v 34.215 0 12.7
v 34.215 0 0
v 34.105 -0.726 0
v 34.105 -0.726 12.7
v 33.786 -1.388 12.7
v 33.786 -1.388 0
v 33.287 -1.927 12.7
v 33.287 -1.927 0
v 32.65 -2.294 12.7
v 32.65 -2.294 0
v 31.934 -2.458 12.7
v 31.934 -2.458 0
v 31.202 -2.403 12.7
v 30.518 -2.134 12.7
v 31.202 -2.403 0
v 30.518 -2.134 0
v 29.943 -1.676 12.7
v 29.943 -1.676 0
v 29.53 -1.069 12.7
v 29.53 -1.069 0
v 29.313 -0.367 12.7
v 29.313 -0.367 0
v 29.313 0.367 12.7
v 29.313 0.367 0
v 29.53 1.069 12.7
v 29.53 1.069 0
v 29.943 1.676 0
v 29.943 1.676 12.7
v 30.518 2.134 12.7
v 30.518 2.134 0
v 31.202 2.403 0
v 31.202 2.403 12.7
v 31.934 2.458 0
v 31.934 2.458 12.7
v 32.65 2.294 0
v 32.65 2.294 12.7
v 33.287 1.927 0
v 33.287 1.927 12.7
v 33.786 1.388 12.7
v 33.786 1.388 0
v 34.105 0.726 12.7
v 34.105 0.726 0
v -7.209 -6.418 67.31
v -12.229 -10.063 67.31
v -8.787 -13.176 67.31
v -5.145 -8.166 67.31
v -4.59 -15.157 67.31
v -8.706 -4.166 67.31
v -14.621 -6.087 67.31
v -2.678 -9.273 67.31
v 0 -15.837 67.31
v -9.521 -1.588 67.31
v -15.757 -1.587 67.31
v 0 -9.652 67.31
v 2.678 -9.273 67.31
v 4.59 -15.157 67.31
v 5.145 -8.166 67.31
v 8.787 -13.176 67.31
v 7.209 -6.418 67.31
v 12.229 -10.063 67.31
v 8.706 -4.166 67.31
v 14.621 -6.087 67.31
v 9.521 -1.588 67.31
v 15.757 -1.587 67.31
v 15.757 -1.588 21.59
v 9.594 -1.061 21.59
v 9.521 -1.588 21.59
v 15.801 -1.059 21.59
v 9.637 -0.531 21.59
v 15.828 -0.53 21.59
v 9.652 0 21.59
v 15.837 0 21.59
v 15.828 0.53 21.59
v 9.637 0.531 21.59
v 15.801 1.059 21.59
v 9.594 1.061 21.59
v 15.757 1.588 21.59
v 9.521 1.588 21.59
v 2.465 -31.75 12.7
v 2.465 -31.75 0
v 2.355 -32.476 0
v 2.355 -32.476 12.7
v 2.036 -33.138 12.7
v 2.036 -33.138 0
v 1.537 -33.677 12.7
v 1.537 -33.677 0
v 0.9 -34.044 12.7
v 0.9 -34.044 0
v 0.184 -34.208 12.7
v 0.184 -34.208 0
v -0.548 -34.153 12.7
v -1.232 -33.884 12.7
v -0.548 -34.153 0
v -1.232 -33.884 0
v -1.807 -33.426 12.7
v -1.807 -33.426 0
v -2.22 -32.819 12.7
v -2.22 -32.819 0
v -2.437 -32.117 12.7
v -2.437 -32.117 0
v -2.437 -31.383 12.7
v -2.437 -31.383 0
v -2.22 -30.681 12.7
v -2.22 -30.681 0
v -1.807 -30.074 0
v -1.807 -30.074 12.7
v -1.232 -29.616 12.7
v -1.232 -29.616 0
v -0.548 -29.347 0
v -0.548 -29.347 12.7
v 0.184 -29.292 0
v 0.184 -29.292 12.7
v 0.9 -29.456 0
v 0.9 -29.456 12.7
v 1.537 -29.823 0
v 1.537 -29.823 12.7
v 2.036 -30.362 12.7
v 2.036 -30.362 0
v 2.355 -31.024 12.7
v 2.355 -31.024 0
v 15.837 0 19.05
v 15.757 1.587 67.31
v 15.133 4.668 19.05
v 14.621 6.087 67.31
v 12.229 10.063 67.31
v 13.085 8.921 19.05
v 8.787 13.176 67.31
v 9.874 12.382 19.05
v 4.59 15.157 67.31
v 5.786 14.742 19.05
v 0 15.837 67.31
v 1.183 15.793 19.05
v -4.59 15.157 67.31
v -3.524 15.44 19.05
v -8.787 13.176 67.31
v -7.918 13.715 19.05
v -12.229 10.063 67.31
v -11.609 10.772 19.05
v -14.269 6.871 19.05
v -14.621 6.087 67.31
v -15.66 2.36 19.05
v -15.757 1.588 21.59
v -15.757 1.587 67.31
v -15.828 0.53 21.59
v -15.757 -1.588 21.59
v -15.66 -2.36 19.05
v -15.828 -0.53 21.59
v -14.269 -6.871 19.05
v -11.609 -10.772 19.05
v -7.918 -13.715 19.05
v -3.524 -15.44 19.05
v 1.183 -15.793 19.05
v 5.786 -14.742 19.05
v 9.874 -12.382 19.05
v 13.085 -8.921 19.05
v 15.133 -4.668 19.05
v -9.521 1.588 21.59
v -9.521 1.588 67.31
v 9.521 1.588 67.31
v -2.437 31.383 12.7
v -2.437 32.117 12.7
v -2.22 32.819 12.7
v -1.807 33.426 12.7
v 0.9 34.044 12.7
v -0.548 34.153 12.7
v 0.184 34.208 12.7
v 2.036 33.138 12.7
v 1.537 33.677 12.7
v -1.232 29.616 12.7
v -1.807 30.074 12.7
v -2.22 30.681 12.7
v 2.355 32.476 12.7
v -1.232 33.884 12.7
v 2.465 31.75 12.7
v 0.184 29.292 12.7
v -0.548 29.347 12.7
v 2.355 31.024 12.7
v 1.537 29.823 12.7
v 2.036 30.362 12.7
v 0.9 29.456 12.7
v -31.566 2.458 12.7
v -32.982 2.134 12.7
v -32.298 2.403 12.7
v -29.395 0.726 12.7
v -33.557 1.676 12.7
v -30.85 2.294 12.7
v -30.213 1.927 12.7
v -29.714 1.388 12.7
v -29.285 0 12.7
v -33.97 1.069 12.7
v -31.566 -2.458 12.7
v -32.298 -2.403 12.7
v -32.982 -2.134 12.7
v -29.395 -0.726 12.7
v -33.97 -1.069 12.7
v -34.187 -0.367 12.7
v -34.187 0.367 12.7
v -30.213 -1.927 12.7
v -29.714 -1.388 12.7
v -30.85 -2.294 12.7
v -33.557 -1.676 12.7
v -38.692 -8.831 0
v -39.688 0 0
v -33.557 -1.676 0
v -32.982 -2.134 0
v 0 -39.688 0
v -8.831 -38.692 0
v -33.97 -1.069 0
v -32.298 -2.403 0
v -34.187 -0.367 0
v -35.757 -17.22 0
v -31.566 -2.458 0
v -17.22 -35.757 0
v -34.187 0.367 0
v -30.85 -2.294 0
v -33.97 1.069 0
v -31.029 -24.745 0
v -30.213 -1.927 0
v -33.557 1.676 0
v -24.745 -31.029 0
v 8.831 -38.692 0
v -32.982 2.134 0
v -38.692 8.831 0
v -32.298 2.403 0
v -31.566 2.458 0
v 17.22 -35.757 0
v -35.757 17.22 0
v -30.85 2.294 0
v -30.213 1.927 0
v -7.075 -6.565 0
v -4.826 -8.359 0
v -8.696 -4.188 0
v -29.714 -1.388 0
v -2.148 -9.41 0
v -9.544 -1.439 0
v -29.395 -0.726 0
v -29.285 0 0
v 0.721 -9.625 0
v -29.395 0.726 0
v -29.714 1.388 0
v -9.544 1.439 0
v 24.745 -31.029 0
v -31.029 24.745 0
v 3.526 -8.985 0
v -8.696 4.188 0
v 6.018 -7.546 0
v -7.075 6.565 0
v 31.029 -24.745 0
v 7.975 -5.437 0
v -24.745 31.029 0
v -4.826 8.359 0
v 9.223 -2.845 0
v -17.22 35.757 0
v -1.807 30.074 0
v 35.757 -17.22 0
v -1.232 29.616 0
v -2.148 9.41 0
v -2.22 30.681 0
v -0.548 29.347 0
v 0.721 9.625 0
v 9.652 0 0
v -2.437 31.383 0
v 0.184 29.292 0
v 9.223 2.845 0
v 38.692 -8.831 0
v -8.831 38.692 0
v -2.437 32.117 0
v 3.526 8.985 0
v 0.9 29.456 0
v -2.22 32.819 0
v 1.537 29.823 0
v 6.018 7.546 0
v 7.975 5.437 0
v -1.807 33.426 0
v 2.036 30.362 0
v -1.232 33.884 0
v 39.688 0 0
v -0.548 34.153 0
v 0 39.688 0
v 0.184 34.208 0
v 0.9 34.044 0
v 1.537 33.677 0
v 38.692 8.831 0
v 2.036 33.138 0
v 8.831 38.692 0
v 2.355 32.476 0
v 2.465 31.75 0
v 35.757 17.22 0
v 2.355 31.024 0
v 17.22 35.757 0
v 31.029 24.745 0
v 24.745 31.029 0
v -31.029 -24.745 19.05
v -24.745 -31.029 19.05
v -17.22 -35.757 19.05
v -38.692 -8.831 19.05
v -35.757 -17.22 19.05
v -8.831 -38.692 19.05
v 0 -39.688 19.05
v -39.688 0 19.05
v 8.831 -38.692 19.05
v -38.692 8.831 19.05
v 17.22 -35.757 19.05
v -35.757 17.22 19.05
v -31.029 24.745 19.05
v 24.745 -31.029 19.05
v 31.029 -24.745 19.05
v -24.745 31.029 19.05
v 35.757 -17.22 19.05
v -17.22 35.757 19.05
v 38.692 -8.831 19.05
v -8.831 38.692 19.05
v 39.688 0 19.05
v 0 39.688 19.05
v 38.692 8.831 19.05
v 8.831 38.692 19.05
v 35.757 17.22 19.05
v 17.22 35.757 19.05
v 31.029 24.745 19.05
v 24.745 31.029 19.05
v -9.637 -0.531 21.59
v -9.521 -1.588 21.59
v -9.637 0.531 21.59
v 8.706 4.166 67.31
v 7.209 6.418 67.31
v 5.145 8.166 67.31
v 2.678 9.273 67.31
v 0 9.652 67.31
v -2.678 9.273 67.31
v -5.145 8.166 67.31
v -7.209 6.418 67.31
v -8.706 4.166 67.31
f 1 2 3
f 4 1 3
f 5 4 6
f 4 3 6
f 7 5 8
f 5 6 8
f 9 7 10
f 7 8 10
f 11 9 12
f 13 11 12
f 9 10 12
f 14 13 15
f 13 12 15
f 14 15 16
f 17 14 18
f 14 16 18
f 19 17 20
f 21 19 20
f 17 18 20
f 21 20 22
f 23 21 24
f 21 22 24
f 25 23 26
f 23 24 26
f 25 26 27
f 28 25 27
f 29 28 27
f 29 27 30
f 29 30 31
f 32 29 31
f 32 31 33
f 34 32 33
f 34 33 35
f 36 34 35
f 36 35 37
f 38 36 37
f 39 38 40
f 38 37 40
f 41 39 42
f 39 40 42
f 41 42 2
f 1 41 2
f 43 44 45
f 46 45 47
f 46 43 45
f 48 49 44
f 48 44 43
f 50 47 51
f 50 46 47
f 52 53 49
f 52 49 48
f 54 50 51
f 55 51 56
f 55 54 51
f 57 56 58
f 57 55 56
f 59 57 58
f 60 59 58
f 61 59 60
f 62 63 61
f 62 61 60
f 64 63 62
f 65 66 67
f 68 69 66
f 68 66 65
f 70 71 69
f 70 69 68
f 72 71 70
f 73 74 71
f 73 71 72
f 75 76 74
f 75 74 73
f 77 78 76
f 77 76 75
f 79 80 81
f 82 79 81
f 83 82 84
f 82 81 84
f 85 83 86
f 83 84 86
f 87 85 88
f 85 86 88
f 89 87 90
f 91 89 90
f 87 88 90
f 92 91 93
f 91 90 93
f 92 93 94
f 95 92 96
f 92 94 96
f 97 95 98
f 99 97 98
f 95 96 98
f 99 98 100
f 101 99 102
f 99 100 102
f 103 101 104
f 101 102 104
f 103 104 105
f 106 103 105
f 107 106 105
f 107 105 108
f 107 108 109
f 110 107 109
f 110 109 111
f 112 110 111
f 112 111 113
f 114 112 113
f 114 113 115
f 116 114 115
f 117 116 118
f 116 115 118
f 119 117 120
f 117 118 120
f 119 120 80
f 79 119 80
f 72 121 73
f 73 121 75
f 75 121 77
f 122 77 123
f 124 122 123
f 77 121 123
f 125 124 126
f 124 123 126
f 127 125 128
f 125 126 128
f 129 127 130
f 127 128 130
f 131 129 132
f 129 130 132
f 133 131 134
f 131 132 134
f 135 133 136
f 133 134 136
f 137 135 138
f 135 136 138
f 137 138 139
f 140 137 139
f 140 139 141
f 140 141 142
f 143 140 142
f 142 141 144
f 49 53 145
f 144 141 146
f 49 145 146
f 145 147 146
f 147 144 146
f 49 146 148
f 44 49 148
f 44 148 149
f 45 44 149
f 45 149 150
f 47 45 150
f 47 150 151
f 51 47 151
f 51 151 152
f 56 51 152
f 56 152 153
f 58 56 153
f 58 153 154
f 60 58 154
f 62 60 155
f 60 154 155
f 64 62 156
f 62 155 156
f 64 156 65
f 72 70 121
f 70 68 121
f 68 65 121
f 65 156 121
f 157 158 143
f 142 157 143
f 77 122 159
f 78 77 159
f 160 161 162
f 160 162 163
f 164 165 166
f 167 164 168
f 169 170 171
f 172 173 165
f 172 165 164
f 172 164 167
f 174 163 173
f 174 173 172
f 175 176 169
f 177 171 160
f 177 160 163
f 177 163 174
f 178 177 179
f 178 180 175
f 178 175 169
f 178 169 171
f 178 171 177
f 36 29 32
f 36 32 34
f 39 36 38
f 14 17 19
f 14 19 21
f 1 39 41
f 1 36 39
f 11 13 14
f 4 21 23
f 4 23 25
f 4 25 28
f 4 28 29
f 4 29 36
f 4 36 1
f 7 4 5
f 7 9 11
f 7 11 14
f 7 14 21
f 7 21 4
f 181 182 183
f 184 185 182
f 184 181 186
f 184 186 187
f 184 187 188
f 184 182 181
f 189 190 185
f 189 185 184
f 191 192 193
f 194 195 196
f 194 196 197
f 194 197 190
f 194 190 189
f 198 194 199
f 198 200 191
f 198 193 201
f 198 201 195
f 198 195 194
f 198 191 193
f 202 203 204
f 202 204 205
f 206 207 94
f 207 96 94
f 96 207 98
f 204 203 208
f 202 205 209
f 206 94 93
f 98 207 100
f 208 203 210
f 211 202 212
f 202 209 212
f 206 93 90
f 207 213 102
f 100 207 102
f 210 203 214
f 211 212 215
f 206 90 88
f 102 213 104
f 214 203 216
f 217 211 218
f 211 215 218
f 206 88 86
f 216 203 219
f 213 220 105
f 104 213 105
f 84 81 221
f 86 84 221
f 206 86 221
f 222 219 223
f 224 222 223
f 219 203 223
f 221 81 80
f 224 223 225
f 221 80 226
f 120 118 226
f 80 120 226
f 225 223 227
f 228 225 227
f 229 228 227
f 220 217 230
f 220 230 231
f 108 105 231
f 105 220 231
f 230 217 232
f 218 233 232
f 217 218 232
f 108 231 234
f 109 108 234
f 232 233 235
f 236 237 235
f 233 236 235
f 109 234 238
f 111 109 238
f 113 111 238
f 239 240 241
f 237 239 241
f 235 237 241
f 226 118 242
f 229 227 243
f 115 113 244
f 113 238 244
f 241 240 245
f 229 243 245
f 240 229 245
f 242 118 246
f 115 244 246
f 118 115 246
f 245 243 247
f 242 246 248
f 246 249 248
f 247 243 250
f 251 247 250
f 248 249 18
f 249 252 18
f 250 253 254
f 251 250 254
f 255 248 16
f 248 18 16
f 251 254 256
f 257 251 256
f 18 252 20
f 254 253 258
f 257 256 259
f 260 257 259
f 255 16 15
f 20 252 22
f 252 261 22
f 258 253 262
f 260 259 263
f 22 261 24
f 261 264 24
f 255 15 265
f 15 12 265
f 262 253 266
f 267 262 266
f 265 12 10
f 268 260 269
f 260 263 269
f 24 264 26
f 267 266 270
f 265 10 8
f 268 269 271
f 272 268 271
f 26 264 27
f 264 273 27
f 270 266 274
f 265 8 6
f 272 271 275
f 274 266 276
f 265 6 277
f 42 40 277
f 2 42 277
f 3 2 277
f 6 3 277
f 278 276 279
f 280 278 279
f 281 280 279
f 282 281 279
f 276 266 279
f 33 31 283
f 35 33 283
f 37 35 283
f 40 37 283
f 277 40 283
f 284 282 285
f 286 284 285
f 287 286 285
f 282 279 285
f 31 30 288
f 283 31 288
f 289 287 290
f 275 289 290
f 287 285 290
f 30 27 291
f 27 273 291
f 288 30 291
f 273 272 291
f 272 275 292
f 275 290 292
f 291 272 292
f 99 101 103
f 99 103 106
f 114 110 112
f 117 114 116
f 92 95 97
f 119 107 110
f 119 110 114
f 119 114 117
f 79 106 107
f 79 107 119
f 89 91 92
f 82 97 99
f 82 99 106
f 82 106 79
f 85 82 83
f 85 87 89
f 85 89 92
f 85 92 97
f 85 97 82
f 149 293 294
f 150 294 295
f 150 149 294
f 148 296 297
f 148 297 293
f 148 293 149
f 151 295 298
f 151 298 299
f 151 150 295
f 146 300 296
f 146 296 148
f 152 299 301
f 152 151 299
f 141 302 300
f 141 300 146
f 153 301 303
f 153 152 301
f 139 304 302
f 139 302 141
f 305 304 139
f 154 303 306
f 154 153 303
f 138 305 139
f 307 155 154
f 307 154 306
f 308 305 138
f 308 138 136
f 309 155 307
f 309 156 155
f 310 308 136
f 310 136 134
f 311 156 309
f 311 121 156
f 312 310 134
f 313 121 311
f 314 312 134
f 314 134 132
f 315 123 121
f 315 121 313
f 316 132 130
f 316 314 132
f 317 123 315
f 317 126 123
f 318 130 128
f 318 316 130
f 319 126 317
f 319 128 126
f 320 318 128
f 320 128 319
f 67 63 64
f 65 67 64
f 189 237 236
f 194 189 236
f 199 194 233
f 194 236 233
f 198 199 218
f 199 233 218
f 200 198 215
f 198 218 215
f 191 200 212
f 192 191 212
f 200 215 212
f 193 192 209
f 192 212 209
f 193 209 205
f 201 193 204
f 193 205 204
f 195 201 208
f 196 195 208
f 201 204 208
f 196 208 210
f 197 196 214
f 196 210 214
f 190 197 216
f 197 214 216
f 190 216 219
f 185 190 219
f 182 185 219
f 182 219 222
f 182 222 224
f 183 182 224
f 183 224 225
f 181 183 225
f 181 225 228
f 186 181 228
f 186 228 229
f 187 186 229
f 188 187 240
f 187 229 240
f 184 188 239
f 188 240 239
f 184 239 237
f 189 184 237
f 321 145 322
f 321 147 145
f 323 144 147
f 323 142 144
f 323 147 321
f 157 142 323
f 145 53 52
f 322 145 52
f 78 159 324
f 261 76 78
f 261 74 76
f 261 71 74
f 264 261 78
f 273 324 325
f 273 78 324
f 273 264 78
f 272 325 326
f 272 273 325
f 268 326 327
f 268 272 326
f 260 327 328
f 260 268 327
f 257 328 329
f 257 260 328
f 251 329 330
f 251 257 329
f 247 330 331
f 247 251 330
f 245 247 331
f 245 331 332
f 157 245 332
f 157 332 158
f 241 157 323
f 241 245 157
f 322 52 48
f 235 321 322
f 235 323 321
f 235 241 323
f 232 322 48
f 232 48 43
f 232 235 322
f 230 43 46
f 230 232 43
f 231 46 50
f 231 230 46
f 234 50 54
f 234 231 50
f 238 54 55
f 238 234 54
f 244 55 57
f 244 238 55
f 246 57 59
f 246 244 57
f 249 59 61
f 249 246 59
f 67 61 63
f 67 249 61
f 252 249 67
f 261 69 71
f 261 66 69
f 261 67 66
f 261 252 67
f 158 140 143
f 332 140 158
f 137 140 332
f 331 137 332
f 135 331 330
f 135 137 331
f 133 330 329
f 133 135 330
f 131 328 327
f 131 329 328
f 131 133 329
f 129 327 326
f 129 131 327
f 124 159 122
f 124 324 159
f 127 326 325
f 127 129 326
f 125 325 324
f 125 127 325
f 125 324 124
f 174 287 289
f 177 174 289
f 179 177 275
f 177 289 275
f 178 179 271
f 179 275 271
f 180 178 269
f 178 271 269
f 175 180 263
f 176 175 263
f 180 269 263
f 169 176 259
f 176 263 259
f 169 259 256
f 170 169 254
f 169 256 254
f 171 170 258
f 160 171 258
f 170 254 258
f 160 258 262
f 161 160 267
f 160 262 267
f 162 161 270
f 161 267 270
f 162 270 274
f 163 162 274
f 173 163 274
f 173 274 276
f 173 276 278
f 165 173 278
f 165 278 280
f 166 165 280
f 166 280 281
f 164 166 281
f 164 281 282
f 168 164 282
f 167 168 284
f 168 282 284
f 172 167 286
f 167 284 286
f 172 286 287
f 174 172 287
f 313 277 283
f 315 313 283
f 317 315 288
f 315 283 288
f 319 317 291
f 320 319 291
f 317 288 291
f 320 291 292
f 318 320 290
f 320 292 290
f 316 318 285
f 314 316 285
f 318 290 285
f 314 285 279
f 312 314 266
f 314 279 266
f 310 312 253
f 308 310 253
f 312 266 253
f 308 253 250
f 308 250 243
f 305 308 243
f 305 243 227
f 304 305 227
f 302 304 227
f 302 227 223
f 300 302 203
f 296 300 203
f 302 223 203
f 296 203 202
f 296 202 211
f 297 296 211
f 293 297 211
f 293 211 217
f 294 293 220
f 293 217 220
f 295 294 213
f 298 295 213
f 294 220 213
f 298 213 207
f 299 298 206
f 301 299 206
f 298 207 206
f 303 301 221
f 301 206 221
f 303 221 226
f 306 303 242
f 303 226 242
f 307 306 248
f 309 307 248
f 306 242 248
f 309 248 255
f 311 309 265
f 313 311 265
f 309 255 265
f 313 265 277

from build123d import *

# Parameters (mm, degrees)
F0_R     = 39.6875
F0_R_2   = 9.652
F1_DEPTH = 19.05
F2_R     = 15.8369
F2_R_2   = 9.652
F3_DEPTH = 48.26
F4_R     = 2.4645418127
F5_DEPTH = 12.7
F7_DEPTH = 45.72


with BuildPart() as f1:
    # F0 (on Top) → F1 (new body)
    with BuildSketch(Plane.XY):
        Circle(F0_R)
        Circle(F0_R_2, mode=Mode.SUBTRACT)
    extrude(amount=F1_DEPTH)

    # F2 (on face) → F3 (join)
    with BuildSketch(Plane.XY.offset(19.05)):
        Circle(F2_R)
        Circle(F2_R_2, mode=Mode.SUBTRACT)
    extrude(amount=F3_DEPTH)

    # F4 (on face) → F5 (cut)
    with BuildSketch(Plane(origin=(0, 0, 0), x_dir=(1, 0, 0), z_dir=(0, 0, -1))):
        with Locations((-31.75, 0)):
            Circle(F4_R)
        with Locations((0, -31.75)):
            Circle(F4_R)
        with Locations((0, 31.75)):
            Circle(F4_R)
        with Locations((31.75, 0)):
            Circle(F4_R)
    extrude(amount=-F5_DEPTH, mode=Mode.SUBTRACT)

    # F6 (on face) → F7 (cut)
    with BuildSketch(Plane.XY.offset(67.31)):
        with BuildLine():
            Line((15.757133158, -1.5875), (25.4, -1.5875))
            Line((25.4, -1.5875), (25.4, 1.5875))
            Line((25.4, 1.5875), (15.757133158, 1.5875))
            ThreePointArc((15.757133158, 1.5875), (15.8169457184, 0.7947513761), (15.8369, 0))
            ThreePointArc((15.8369, 0), (15.8169457184, -0.7947513761), (15.757133158, -1.5875))
        make_face()
        with BuildLine():
            Line((9.5205539623, -1.5875), (15.757133158, -1.5875))
            ThreePointArc((15.757133158, -1.5875), (15.8169457184, -0.7947513761), (15.8369, 0))
            ThreePointArc((15.8369, 0), (15.8169457184, 0.7947513761), (15.757133158, 1.5875))
            Line((15.757133158, 1.5875), (9.5205539623, 1.5875))
            ThreePointArc((9.5205539623, 1.5875), (9.6190823586, 0.7964663067), (9.652, 0))
            ThreePointArc((9.652, 0), (9.6190823586, -0.7964663067), (9.5205539623, -1.5875))
        make_face()
        with BuildLine():
            ThreePointArc((-15.757133158, 1.5875), (-15.8369, 0), (-15.757133158, -1.5875))
            Line((-15.757133158, -1.5875), (-9.5205539623, -1.5875))
            ThreePointArc((-9.5205539623, -1.5875), (-9.652, 0), (-9.5205539623, 1.5875))
            Line((-9.5205539623, 1.5875), (-15.757133158, 1.5875))
        make_face()
        with BuildLine():
            Line((-25.4, -1.5875), (-15.757133158, -1.5875))
            ThreePointArc((-15.757133158, -1.5875), (-15.8369, 0), (-15.757133158, 1.5875))
            Line((-15.757133158, 1.5875), (-25.4, 1.5875))
            Line((-25.4, 1.5875), (-25.4, -1.5875))
        make_face()
    extrude(amount=-F7_DEPTH, mode=Mode.SUBTRACT)


solid = f1.part
